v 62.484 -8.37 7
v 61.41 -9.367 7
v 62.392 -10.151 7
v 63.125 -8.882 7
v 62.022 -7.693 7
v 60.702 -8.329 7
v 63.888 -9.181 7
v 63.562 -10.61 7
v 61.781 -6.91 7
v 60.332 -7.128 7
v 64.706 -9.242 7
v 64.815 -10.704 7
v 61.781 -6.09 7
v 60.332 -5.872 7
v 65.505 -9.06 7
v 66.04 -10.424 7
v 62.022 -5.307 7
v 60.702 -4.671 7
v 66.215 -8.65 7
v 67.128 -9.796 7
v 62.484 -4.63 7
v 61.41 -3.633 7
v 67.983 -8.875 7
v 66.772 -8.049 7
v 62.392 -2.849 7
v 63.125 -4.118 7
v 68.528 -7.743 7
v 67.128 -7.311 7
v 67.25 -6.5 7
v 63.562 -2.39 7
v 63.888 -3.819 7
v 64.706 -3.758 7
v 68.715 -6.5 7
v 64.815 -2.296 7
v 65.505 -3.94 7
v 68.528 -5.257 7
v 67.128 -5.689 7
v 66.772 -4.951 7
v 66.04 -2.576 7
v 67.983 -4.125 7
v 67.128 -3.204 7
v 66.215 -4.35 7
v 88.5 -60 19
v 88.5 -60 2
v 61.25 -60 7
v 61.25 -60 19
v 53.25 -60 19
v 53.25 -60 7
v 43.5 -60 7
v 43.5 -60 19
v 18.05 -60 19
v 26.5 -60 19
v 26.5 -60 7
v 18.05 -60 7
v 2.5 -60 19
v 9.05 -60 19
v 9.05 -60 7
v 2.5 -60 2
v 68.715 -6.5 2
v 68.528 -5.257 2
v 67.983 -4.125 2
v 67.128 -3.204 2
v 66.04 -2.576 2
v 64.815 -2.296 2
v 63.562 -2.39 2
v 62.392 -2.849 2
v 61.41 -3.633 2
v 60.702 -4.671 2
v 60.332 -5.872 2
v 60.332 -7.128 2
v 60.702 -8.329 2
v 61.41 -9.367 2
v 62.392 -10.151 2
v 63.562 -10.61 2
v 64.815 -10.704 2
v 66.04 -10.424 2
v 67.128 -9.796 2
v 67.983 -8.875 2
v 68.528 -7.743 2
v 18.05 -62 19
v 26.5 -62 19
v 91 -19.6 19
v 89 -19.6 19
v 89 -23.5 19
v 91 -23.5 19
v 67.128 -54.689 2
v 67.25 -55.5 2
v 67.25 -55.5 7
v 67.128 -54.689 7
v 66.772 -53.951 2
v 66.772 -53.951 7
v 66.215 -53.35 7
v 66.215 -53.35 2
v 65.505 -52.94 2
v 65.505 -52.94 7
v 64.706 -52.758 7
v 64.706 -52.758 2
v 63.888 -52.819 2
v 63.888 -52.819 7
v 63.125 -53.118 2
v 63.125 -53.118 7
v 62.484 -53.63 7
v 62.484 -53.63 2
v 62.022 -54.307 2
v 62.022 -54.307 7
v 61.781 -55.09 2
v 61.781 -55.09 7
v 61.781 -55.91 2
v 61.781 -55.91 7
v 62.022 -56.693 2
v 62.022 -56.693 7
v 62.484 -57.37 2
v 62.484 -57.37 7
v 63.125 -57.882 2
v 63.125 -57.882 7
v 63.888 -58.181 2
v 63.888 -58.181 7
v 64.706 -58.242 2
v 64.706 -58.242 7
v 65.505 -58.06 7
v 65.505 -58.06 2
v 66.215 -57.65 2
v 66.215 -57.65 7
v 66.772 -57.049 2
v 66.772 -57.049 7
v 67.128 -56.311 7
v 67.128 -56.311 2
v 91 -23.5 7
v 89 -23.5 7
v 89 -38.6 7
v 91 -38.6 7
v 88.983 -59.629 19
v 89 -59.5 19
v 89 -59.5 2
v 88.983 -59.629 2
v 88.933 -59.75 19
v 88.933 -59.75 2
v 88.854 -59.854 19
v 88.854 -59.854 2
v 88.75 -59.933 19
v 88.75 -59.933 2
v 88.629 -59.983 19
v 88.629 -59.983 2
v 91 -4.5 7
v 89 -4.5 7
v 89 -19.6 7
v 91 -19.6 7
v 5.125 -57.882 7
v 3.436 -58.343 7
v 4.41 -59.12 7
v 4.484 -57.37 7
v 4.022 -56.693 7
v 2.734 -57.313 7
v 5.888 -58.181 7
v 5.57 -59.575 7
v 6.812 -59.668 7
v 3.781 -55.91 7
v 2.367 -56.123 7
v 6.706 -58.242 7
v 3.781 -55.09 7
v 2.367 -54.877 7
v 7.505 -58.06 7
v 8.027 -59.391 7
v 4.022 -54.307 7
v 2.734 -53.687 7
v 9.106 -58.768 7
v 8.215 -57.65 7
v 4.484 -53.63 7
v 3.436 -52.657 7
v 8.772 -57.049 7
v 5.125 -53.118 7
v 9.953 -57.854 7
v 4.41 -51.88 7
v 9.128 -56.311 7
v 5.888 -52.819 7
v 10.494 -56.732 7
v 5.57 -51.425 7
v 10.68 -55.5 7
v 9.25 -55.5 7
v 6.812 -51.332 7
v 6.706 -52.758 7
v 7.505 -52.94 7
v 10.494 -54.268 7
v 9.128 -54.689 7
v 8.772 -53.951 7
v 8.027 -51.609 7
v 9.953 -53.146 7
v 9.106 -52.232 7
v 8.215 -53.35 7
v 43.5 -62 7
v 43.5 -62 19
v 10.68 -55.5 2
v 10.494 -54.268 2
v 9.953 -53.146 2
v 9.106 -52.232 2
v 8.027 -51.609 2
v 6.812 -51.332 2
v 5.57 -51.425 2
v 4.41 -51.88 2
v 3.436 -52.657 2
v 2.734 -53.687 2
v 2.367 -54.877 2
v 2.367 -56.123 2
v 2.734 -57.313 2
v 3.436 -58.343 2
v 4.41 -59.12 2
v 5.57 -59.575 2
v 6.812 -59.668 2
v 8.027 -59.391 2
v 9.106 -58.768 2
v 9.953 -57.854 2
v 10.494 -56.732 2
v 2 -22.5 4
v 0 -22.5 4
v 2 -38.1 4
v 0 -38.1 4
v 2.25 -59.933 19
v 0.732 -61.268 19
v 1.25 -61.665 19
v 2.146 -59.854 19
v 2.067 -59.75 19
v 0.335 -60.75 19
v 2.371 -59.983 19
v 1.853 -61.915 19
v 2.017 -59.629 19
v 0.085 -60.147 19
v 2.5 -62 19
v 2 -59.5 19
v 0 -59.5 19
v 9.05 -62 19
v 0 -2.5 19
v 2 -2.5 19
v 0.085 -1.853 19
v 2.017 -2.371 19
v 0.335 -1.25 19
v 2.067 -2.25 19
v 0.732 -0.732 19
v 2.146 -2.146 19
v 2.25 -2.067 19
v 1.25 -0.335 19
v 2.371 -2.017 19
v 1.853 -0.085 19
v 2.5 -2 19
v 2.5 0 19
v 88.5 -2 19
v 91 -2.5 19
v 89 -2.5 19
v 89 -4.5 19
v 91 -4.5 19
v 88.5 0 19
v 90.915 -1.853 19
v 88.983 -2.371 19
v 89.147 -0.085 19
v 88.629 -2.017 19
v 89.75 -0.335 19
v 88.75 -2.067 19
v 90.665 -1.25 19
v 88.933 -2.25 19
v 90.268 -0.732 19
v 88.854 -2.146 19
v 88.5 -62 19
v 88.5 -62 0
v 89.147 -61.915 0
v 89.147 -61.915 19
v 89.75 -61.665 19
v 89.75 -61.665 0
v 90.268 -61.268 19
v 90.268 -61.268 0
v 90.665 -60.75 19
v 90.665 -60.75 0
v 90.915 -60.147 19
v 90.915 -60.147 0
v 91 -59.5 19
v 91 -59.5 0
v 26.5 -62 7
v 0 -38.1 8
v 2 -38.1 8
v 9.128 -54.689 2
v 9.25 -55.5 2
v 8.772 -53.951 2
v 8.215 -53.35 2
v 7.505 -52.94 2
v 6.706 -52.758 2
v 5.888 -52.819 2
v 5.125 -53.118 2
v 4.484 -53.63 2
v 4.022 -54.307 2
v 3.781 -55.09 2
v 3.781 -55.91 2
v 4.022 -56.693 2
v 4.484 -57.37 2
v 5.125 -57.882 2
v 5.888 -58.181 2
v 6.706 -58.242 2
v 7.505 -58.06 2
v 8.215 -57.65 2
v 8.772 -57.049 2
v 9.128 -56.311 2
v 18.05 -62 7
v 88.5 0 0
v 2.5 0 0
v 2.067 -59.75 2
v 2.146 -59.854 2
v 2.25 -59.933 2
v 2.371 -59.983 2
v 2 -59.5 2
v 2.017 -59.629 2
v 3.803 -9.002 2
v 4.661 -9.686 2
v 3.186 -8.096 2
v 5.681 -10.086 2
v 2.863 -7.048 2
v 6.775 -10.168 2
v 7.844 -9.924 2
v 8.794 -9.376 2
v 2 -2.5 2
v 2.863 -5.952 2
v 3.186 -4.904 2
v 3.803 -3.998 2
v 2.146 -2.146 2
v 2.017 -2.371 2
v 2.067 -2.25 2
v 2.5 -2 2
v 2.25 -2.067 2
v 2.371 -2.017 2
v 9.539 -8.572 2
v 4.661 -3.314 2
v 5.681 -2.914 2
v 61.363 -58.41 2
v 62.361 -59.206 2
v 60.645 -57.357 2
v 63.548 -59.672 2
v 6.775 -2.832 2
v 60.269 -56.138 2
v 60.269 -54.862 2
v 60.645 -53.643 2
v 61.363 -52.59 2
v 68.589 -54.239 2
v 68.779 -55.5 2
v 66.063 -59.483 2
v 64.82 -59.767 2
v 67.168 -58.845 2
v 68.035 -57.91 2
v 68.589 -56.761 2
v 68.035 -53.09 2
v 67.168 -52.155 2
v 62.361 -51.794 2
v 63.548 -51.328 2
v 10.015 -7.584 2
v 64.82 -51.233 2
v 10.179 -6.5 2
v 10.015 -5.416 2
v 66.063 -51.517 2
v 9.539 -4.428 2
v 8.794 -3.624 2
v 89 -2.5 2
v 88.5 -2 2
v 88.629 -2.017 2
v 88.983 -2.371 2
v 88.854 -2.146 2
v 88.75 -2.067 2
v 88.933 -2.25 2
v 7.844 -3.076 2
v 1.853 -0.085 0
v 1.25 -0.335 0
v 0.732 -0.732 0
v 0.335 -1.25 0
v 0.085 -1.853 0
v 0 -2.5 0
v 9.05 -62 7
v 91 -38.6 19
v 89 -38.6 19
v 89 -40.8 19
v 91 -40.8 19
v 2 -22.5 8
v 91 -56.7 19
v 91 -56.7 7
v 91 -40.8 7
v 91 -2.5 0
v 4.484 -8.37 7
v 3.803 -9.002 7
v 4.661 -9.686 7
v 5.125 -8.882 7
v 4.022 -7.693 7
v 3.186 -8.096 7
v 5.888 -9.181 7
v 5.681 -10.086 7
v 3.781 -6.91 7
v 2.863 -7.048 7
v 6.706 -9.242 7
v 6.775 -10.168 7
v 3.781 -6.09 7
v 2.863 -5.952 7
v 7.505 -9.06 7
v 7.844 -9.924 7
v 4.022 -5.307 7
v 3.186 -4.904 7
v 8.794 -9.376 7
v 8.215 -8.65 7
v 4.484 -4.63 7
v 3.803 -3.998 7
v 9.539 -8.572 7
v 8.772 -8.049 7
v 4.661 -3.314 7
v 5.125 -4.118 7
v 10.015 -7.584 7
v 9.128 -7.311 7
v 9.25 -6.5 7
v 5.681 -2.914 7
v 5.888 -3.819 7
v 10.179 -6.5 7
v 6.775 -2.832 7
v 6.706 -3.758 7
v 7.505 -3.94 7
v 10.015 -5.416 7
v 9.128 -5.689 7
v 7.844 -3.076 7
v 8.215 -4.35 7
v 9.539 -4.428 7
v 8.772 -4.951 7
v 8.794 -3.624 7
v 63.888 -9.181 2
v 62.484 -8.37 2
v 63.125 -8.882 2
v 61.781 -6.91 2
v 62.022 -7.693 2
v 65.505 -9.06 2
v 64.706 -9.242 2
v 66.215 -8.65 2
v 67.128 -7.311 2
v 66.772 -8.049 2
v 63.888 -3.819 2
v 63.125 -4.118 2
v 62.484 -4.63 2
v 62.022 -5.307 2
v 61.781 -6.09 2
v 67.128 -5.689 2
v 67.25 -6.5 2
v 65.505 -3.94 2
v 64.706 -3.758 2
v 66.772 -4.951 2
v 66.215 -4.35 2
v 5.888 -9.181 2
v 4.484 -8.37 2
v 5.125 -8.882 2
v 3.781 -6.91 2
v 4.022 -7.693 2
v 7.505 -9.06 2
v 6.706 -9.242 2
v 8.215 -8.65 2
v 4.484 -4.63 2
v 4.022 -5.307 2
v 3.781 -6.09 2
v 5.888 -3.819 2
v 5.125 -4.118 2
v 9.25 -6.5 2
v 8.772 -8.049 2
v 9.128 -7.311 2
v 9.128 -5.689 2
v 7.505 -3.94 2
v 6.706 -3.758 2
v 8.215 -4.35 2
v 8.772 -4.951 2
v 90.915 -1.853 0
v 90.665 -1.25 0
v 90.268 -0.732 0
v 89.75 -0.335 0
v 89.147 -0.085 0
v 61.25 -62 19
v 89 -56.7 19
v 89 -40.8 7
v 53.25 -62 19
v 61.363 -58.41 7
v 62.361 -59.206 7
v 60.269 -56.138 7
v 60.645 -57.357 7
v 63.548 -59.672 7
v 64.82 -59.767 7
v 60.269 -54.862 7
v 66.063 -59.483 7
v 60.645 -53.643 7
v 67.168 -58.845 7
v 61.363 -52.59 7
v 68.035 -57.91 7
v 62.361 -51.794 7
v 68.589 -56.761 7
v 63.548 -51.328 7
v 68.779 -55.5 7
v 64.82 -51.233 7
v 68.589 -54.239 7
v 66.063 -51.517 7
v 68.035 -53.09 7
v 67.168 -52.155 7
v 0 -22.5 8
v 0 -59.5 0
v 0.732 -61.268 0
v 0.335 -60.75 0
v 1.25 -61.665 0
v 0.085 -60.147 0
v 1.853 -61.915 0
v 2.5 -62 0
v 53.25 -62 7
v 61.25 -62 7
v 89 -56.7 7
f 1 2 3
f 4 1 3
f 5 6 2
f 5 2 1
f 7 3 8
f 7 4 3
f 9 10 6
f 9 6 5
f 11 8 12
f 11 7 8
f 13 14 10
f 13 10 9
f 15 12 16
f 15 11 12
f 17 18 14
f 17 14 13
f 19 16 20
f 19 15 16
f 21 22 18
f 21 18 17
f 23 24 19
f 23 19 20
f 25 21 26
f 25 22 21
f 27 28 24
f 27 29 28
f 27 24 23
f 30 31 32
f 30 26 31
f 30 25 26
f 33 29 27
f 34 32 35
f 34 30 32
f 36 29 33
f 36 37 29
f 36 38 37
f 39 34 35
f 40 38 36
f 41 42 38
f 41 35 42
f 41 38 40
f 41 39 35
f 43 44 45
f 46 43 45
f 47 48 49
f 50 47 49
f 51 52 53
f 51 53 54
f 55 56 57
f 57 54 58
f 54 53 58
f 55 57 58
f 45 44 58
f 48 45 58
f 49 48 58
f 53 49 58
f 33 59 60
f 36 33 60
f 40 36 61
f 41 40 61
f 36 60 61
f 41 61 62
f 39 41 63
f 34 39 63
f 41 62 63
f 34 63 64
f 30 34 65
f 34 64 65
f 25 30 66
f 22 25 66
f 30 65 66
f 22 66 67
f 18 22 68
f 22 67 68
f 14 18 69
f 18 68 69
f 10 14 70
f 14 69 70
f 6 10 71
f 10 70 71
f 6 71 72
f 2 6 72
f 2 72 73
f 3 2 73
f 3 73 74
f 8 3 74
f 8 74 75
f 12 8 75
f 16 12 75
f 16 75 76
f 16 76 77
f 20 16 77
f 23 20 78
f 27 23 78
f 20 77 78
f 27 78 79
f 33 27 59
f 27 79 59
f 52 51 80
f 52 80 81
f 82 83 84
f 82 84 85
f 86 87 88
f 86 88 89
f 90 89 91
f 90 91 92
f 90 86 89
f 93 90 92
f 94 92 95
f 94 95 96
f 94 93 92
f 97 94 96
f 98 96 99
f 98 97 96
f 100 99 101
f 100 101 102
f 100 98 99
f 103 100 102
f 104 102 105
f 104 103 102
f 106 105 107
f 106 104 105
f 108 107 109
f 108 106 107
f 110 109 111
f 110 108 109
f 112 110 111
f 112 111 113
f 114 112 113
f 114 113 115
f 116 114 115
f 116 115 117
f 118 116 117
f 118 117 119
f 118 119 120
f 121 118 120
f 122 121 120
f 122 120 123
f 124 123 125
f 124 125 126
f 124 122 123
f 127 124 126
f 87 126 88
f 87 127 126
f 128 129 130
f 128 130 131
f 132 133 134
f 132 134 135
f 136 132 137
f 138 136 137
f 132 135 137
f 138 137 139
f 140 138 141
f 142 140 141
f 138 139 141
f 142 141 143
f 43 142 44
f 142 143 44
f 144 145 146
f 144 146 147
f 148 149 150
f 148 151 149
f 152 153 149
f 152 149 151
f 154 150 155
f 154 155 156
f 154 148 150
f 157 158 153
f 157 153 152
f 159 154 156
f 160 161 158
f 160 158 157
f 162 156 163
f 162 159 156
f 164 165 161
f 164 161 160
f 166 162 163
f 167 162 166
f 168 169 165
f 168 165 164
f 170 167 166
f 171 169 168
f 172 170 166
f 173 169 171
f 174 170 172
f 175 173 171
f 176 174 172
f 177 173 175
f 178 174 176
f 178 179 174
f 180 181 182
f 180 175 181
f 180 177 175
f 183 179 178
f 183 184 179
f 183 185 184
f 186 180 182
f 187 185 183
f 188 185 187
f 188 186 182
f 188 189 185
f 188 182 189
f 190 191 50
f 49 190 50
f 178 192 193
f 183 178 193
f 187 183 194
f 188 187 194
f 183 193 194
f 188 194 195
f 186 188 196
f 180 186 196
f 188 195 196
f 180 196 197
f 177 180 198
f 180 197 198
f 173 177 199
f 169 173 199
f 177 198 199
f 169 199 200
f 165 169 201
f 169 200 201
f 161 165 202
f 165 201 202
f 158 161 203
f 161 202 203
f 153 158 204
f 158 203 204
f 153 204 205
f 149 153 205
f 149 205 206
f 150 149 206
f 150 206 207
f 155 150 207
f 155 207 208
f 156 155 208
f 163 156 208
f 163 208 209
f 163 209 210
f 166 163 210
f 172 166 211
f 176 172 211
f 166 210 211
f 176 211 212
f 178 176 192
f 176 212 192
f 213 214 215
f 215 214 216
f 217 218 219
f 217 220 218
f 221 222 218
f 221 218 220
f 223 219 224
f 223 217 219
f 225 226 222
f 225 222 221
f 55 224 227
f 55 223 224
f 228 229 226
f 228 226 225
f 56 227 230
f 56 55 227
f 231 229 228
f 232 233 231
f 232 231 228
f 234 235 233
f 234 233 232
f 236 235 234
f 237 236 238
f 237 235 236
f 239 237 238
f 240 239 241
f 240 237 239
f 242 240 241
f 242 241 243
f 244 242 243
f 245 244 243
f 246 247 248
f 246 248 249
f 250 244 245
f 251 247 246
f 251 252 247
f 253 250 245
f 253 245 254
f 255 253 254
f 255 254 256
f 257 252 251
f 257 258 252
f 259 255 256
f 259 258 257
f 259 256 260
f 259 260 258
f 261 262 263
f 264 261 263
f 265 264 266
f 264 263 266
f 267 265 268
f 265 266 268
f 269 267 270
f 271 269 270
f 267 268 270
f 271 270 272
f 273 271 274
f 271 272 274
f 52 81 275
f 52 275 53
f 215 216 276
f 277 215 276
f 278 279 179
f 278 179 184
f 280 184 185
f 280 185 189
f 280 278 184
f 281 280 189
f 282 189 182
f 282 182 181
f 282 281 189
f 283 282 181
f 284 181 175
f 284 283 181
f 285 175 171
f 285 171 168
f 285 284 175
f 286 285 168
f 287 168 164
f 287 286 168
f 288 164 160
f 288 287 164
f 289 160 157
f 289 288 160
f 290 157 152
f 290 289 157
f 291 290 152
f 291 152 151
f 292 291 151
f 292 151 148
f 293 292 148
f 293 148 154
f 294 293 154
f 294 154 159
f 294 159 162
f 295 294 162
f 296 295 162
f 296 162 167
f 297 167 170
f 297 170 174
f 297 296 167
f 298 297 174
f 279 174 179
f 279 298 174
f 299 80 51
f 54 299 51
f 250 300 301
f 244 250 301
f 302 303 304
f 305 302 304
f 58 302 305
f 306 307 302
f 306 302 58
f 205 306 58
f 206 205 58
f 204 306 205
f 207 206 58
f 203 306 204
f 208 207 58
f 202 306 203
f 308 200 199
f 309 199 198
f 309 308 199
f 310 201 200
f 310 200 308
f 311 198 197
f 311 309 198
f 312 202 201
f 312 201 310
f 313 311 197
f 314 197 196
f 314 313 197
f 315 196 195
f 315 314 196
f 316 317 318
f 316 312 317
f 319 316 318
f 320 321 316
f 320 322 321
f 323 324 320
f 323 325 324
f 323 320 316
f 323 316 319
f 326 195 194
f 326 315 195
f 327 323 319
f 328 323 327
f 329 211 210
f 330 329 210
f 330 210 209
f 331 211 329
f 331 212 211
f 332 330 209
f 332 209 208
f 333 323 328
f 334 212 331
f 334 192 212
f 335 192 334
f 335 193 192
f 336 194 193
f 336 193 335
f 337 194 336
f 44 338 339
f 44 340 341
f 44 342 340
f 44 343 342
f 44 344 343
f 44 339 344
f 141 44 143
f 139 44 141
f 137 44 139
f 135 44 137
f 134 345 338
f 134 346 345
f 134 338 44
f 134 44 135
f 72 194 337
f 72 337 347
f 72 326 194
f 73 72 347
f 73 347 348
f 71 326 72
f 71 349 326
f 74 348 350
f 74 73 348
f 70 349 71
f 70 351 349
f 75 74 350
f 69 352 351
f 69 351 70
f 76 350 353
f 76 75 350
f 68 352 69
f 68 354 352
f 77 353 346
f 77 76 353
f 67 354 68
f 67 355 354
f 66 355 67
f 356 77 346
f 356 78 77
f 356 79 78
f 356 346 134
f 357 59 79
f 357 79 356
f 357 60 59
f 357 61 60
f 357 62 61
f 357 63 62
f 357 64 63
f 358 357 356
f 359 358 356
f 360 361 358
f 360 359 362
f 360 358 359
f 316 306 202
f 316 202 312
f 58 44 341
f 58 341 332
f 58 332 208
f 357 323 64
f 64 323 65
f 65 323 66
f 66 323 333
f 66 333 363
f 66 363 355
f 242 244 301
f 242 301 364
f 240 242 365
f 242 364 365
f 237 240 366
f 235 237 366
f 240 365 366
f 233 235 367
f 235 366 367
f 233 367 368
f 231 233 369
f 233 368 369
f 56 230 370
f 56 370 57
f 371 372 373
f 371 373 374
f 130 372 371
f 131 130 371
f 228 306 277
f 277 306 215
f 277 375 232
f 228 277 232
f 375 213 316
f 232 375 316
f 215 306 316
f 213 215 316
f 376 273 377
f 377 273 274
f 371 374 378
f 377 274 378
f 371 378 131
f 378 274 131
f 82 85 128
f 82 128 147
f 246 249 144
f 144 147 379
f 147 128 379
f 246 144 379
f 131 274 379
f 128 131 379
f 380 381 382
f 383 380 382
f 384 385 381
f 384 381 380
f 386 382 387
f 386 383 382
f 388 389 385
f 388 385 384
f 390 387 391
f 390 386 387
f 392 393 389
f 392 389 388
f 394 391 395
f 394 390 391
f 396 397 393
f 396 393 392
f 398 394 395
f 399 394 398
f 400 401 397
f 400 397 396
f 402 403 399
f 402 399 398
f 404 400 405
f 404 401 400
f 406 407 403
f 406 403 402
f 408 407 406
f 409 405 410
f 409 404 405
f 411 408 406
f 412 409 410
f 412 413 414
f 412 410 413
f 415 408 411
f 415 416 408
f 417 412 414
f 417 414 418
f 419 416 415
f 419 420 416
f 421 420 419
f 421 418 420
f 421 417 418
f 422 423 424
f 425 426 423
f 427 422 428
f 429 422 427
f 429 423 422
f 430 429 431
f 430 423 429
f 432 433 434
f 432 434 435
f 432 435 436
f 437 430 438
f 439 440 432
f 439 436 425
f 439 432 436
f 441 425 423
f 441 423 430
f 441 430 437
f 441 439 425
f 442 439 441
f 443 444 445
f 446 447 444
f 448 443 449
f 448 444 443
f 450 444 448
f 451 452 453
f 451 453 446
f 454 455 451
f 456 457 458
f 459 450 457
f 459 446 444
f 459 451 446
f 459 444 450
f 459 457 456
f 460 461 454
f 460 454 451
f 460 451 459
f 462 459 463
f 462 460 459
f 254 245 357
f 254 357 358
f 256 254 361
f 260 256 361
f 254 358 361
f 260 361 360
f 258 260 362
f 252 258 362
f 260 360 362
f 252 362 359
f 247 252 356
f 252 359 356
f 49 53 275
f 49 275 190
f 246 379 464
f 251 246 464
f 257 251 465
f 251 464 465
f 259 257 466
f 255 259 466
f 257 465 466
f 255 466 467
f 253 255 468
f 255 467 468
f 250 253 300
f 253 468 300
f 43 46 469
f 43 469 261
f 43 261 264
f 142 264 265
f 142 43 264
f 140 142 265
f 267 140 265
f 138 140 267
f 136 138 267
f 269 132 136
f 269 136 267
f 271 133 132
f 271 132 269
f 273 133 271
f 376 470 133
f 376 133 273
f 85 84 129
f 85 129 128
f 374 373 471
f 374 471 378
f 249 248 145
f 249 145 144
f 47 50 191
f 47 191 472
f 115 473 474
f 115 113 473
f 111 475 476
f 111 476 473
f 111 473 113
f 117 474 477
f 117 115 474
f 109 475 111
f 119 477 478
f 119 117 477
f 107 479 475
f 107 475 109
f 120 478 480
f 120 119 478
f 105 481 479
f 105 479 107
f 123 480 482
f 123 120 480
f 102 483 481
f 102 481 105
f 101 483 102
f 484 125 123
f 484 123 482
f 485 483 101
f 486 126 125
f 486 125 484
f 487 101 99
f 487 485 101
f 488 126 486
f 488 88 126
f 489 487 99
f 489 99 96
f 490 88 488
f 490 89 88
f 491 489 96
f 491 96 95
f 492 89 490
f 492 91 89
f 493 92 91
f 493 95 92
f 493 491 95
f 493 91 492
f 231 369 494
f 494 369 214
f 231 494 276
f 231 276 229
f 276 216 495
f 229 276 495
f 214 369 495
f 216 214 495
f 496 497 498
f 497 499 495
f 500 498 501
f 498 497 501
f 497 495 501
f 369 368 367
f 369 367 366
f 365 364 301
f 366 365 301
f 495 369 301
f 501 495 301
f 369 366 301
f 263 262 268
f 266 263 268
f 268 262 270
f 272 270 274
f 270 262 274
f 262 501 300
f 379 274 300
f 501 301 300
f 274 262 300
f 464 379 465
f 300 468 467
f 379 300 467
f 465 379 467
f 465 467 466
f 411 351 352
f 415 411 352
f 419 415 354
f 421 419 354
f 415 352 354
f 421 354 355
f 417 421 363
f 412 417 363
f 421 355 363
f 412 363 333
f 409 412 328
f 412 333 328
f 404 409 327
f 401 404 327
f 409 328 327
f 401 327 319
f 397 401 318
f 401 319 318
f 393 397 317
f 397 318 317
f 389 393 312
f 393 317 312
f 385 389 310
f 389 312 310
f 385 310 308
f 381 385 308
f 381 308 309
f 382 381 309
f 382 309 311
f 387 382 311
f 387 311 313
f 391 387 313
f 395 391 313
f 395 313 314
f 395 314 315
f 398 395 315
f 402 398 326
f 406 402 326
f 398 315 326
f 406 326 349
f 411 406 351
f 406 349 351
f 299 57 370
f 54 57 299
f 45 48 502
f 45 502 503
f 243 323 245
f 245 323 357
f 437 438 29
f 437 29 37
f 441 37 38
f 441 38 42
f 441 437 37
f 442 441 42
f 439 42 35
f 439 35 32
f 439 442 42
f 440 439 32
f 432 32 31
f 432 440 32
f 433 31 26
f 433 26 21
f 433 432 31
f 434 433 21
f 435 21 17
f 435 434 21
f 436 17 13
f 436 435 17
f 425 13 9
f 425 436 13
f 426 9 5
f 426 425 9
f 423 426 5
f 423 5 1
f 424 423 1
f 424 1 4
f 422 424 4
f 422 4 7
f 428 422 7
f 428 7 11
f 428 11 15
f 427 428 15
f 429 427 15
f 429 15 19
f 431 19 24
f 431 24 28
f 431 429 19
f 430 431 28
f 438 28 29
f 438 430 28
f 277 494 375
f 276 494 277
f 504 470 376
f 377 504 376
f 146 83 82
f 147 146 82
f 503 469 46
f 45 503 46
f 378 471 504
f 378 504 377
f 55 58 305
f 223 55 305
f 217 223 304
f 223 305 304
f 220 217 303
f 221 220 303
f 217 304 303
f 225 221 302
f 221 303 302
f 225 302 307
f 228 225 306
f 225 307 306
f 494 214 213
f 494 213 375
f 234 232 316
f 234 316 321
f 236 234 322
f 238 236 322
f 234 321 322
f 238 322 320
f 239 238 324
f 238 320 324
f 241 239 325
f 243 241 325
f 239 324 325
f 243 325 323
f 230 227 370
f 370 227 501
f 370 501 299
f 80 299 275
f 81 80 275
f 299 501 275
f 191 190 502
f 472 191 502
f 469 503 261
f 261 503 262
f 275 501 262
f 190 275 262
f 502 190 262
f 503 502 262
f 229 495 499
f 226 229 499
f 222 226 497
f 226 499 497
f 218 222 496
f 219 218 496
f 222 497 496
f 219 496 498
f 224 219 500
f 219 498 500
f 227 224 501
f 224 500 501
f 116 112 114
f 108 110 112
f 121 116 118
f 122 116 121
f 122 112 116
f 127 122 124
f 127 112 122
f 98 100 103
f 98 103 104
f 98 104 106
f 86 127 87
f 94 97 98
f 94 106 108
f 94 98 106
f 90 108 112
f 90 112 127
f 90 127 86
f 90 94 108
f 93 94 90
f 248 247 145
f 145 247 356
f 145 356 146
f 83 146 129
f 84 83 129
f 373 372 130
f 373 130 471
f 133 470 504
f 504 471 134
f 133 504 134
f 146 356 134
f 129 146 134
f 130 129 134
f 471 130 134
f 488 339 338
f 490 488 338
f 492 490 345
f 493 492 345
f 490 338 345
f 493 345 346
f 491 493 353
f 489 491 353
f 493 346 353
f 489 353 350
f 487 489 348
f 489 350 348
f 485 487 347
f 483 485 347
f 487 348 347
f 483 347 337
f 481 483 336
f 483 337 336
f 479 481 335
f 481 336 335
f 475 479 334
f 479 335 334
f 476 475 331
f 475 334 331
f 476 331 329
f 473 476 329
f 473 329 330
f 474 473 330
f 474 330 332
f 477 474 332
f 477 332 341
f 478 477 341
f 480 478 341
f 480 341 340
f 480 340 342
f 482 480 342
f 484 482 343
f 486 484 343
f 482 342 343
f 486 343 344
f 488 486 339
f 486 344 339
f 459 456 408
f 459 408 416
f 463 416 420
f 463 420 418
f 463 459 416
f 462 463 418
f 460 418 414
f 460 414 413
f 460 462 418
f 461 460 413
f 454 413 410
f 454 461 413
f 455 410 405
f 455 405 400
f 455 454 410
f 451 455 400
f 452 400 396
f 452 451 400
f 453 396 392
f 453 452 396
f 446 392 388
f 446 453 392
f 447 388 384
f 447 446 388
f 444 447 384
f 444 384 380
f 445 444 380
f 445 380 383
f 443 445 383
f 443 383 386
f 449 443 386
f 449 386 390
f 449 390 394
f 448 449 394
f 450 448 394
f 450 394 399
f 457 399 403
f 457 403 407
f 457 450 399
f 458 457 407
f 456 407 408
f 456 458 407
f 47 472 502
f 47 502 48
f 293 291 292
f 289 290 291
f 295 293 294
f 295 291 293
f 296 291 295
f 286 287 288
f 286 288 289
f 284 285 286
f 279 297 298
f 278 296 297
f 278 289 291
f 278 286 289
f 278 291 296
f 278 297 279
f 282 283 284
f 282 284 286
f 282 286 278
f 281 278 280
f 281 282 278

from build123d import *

# Parameters (mm, degrees)
F1_DEPTH = 2
F2_DEPTH = 19
F3_R     = 3.678544
F3_R_2   = 2.75
F3_R_3   = 4.215462
F3_R_4   = 4.179516
F3_R_5   = 4.278838
F4_DEPTH = 5
F5_W     = 2
F5_H     = 15.1
F5_H_2   = 15.9
F5_W_2   = 9
F5_H_3   = 2
F5_W_3   = 17
F5_W_4   = 8
F6_DEPTH = 12
F7_W     = 15.6
F7_H     = 4
F8_DEPTH = 2


with BuildPart() as f1:
    # F0 (on Top) → F1 (new body)
    with BuildSketch(Plane.XY):
        with BuildLine():
            Line((88.5, 0), (2.5, 0))
            ThreePointArc((2.5, 0), (0.732233, -0.732233), (0, -2.5))
            Line((0, -2.5), (0, -59.5))
            ThreePointArc((0, -59.5), (0.732233, -61.267767), (2.5, -62))
            Line((2.5, -62), (88.5, -62))
            ThreePointArc((88.5, -62), (90.267767, -61.267767), (91, -59.5))
            Line((91, -59.5), (91, -2.5))
            ThreePointArc((91, -2.5), (90.267767, -0.732233), (88.5, 0))
        make_face()
        with BuildLine():
            ThreePointArc((2, -2.5), (2.146447, -2.146447), (2.5, -2))
            Line((2.5, -2), (88.5, -2))
            ThreePointArc((88.5, -2), (88.853553, -2.146447), (89, -2.5))
            Line((89, -2.5), (89, -59.5))
            ThreePointArc((89, -59.5), (88.853553, -59.853553), (88.5, -60))
            Line((88.5, -60), (2.5, -60))
            ThreePointArc((2.5, -60), (2.146447, -59.853553), (2, -59.5))
            Line((2, -59.5), (2, -2.5))
        make_face(mode=Mode.SUBTRACT)
        with BuildLine():
            Line((88.5, -2), (2.5, -2))
            ThreePointArc((2.5, -2), (2.146447, -2.146447), (2, -2.5))
            Line((2, -2.5), (2, -59.5))
            ThreePointArc((2, -59.5), (2.146447, -59.853553), (2.5, -60))
            Line((2.5, -60), (88.5, -60))
            ThreePointArc((88.5, -60), (88.853553, -59.853553), (89, -59.5))
            Line((89, -59.5), (89, -2.5))
            ThreePointArc((89, -2.5), (88.853553, -2.146447), (88.5, -2))
        make_face()
    extrude(amount=F1_DEPTH)

    # F0 (on Top) → F2 (join)
    with BuildSketch(Plane.XY):
        with BuildLine():
            Line((88.5, 0), (2.5, 0))
            ThreePointArc((2.5, 0), (0.732233, -0.732233), (0, -2.5))
            Line((0, -2.5), (0, -59.5))
            ThreePointArc((0, -59.5), (0.732233, -61.267767), (2.5, -62))
            Line((2.5, -62), (88.5, -62))
            ThreePointArc((88.5, -62), (90.267767, -61.267767), (91, -59.5))
            Line((91, -59.5), (91, -2.5))
            ThreePointArc((91, -2.5), (90.267767, -0.732233), (88.5, 0))
        make_face()
        with BuildLine():
            ThreePointArc((2, -2.5), (2.146447, -2.146447), (2.5, -2))
            Line((2.5, -2), (88.5, -2))
            ThreePointArc((88.5, -2), (88.853553, -2.146447), (89, -2.5))
            Line((89, -2.5), (89, -59.5))
            ThreePointArc((89, -59.5), (88.853553, -59.853553), (88.5, -60))
            Line((88.5, -60), (2.5, -60))
            ThreePointArc((2.5, -60), (2.146447, -59.853553), (2, -59.5))
            Line((2, -59.5), (2, -2.5))
        make_face(mode=Mode.SUBTRACT)
    extrude(amount=F2_DEPTH)

    # F3 (on face) → F4 (join)
    with BuildSketch(Plane.XY.offset(2)):
        with Locations((6.5, -6.5)):
            Circle(F3_R)
        with Locations((6.5, -6.5)):
            Circle(F3_R_2, mode=Mode.SUBTRACT)
        with Locations((64.5, -6.5)):
            Circle(F3_R_3)
        with Locations((64.5, -6.5)):
            Circle(F3_R_2, mode=Mode.SUBTRACT)
        with Locations((6.5, -55.5)):
            Circle(F3_R_4)
        with Locations((6.5, -55.5)):
            Circle(F3_R_2, mode=Mode.SUBTRACT)
        with Locations((64.5, -55.5)):
            Circle(F3_R_5)
        with Locations((64.5, -55.5)):
            Circle(F3_R_2, mode=Mode.SUBTRACT)
    extrude(amount=F4_DEPTH)

    # F5 (on face) → F6 (cut)
    with BuildSketch(Plane.XY.offset(19)):
        with Locations((90, -12.05)):
            Rectangle(F5_W, F5_H)
        with Locations((90, -31.05)):
            Rectangle(F5_W, F5_H)
        with Locations((90, -48.75)):
            Rectangle(F5_W, F5_H_2)
        with Locations((13.55, -61)):
            Rectangle(F5_W_2, F5_H_3)
        with Locations((35, -61)):
            Rectangle(F5_W_3, F5_H_3)
        with Locations((57.25, -61)):
            Rectangle(F5_W_4, F5_H_3)
    extrude(amount=-F6_DEPTH, mode=Mode.SUBTRACT)

    # F7 (on face) → F8 (cut)
    with BuildSketch(Plane(origin=(0, 0, 0), x_dir=(0, -1, 0), z_dir=(-1, 0, 0))):
        with Locations((30.3, 6)):
            Rectangle(F7_W, F7_H)
    extrude(amount=-F8_DEPTH, mode=Mode.SUBTRACT)


solid = f1.part
